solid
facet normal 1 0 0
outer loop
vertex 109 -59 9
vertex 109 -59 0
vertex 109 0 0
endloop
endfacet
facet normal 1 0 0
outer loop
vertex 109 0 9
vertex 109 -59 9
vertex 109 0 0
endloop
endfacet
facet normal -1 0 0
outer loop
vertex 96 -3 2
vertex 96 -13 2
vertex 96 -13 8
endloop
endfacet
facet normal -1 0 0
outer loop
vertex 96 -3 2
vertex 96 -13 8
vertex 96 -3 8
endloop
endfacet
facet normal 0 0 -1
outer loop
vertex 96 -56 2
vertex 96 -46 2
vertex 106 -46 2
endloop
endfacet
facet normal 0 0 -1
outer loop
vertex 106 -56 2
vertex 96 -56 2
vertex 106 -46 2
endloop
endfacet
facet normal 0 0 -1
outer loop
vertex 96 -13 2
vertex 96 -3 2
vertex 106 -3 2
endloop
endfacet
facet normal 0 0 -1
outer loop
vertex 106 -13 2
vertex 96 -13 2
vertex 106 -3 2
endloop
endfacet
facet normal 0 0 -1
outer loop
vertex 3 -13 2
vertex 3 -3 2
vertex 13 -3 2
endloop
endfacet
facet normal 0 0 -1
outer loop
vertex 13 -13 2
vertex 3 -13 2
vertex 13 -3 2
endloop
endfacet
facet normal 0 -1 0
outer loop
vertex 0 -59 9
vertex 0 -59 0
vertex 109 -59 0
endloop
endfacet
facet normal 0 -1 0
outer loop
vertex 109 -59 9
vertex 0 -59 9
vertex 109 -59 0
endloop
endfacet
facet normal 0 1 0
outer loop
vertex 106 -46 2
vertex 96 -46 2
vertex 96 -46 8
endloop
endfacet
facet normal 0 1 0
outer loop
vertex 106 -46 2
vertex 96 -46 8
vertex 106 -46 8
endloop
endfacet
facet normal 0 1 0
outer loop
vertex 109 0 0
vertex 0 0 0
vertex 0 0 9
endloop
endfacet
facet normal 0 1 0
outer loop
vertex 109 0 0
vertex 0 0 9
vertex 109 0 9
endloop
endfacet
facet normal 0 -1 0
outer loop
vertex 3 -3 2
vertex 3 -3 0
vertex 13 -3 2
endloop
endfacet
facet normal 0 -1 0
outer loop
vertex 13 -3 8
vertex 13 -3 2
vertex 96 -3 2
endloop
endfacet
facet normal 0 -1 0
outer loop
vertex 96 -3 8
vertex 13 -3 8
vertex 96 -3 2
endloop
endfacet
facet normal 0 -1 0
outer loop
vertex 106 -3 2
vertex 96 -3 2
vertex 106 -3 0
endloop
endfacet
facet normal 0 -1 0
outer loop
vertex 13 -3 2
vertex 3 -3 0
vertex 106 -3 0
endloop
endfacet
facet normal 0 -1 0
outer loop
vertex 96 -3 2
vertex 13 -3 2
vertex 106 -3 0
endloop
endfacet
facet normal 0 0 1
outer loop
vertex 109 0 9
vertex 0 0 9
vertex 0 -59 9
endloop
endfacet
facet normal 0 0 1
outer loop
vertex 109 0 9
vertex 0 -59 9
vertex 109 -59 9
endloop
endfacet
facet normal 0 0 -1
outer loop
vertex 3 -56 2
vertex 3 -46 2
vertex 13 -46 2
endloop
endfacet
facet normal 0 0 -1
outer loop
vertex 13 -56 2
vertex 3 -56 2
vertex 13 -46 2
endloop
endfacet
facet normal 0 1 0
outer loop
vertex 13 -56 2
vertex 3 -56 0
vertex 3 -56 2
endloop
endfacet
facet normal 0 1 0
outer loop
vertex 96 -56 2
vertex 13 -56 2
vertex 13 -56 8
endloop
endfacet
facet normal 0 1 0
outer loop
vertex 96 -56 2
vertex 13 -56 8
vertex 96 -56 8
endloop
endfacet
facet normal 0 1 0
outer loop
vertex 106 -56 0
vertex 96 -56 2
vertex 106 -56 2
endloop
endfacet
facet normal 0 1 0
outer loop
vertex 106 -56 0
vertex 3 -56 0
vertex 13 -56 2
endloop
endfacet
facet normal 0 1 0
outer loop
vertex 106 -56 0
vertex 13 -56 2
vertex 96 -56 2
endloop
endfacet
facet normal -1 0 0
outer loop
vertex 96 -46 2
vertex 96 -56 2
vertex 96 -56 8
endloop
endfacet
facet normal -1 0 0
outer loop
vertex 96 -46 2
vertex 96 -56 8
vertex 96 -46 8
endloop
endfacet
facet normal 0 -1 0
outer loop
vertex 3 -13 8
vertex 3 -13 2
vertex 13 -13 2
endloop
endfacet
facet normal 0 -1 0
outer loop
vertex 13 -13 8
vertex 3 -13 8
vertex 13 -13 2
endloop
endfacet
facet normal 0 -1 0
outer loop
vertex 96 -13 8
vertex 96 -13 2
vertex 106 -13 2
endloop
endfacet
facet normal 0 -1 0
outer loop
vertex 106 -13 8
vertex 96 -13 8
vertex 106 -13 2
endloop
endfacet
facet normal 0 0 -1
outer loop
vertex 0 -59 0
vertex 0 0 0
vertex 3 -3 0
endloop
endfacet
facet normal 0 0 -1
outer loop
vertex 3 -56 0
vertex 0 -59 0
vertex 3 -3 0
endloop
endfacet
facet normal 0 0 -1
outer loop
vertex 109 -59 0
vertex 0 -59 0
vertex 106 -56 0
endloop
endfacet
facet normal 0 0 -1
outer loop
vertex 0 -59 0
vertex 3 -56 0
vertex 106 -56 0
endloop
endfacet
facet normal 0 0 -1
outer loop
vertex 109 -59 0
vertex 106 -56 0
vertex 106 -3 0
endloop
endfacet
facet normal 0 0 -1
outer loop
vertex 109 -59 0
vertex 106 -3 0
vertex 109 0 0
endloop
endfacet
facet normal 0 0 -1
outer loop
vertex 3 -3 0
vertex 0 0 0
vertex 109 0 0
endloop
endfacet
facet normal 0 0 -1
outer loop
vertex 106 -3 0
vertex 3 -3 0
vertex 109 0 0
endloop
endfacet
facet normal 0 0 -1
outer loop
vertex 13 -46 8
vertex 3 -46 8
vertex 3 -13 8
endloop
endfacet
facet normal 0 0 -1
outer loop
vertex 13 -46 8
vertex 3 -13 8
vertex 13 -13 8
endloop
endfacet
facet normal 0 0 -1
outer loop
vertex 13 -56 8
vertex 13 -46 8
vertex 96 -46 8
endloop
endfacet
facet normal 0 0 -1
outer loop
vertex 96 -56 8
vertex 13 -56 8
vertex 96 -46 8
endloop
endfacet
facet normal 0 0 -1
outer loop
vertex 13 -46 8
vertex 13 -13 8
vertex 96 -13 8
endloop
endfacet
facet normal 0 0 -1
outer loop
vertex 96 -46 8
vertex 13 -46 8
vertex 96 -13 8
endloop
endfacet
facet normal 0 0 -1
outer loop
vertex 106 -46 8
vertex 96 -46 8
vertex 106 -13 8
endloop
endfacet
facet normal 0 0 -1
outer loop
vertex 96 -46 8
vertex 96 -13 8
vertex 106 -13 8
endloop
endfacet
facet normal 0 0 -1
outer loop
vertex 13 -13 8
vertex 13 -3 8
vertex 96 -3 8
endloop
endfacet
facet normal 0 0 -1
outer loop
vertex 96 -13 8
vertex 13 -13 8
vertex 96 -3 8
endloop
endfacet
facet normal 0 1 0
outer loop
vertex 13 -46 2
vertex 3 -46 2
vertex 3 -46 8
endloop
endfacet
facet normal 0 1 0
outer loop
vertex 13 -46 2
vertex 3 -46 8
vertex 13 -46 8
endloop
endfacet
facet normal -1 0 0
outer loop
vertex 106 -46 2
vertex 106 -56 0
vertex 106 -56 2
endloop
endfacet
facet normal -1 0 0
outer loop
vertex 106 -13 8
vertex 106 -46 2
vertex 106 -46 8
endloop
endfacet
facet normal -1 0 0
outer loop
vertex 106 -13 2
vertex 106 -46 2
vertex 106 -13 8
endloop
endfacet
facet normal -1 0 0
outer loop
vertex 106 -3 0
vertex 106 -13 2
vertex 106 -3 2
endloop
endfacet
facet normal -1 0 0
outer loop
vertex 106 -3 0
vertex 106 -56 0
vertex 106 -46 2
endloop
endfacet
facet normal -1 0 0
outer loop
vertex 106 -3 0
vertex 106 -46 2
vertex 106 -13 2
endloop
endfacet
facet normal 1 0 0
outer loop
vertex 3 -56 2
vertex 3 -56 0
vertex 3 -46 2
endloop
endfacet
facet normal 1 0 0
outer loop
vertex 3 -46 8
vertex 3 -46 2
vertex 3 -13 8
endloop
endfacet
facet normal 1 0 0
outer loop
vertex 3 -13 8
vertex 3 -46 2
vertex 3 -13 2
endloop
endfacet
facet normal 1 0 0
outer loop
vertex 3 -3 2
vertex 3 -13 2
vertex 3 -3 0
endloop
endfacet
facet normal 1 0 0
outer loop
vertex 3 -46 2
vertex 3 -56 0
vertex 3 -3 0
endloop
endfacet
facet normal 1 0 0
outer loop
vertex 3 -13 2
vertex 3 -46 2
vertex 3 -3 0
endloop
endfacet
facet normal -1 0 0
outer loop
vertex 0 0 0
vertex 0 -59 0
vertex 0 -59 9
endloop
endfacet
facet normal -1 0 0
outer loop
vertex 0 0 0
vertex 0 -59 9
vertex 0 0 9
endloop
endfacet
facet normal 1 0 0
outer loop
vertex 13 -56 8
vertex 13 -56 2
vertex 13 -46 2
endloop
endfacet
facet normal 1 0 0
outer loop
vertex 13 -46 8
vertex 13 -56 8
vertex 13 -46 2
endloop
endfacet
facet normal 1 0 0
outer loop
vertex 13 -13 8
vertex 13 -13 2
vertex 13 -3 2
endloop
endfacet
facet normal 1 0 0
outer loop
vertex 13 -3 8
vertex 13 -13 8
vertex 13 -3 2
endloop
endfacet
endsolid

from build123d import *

# Parameters (mm, degrees)
ESQUISSE1_W             = 109
ESQUISSE1_H             = 59
BOSS_EXTRU_1_DEPTH      = 9
ESQUISSE2_W             = 103
ESQUISSE2_H             = 53
ENL_V_MAT_EXTRU_1_DEPTH = 8
ESQUISSE3_W             = 10
ESQUISSE3_H             = 10
BOSS_EXTRU_2_DEPTH      = 9
ESQUISSE4_W             = 10
ESQUISSE4_H             = 10
ENL_V_MAT_EXTRU_2_DEPTH = 2


with BuildPart() as part:
    # Esquisse1 → Boss.-Extru.1 (new body)
    with BuildSketch(Plane.XY):
        with Locations((54.5, -29.5)):
            Rectangle(ESQUISSE1_W, ESQUISSE1_H)
    extrude(amount=BOSS_EXTRU_1_DEPTH)

    # Esquisse2 → Enlèv. mat.-Extru.1 (cut)
    with BuildSketch(Plane.XY):
        with Locations((54.5, -29.5)):
            Rectangle(ESQUISSE2_W, ESQUISSE2_H)
    extrude(amount=ENL_V_MAT_EXTRU_1_DEPTH, mode=Mode.SUBTRACT)

    # Esquisse3 → Boss.-Extru.2 (add)
    with BuildSketch(Plane.XY):
        with Locations((101, -8)):
            Rectangle(ESQUISSE3_W, ESQUISSE3_H)
        with Locations((101, -51)):
            Rectangle(ESQUISSE3_W, ESQUISSE3_H)
        with Locations((8, -51)):
            Rectangle(ESQUISSE3_W, ESQUISSE3_H)
        with Locations((8, -8)):
            Rectangle(ESQUISSE3_W, ESQUISSE3_H)
    extrude(amount=BOSS_EXTRU_2_DEPTH)

    # Esquisse4 → Enlèv. mat.-Extru.2 (cut)
    with BuildSketch(Plane.XY):
        with Locations((101, -8)):
            Rectangle(ESQUISSE4_W, ESQUISSE4_H)
        with Locations((101, -51)):
            Rectangle(ESQUISSE4_W, ESQUISSE4_H)
        with Locations((8, -51)):
            Rectangle(ESQUISSE4_W, ESQUISSE4_H)
        with Locations((8, -8)):
            Rectangle(ESQUISSE4_W, ESQUISSE4_H)
    extrude(amount=ENL_V_MAT_EXTRU_2_DEPTH, mode=Mode.SUBTRACT)


solid = part.part
